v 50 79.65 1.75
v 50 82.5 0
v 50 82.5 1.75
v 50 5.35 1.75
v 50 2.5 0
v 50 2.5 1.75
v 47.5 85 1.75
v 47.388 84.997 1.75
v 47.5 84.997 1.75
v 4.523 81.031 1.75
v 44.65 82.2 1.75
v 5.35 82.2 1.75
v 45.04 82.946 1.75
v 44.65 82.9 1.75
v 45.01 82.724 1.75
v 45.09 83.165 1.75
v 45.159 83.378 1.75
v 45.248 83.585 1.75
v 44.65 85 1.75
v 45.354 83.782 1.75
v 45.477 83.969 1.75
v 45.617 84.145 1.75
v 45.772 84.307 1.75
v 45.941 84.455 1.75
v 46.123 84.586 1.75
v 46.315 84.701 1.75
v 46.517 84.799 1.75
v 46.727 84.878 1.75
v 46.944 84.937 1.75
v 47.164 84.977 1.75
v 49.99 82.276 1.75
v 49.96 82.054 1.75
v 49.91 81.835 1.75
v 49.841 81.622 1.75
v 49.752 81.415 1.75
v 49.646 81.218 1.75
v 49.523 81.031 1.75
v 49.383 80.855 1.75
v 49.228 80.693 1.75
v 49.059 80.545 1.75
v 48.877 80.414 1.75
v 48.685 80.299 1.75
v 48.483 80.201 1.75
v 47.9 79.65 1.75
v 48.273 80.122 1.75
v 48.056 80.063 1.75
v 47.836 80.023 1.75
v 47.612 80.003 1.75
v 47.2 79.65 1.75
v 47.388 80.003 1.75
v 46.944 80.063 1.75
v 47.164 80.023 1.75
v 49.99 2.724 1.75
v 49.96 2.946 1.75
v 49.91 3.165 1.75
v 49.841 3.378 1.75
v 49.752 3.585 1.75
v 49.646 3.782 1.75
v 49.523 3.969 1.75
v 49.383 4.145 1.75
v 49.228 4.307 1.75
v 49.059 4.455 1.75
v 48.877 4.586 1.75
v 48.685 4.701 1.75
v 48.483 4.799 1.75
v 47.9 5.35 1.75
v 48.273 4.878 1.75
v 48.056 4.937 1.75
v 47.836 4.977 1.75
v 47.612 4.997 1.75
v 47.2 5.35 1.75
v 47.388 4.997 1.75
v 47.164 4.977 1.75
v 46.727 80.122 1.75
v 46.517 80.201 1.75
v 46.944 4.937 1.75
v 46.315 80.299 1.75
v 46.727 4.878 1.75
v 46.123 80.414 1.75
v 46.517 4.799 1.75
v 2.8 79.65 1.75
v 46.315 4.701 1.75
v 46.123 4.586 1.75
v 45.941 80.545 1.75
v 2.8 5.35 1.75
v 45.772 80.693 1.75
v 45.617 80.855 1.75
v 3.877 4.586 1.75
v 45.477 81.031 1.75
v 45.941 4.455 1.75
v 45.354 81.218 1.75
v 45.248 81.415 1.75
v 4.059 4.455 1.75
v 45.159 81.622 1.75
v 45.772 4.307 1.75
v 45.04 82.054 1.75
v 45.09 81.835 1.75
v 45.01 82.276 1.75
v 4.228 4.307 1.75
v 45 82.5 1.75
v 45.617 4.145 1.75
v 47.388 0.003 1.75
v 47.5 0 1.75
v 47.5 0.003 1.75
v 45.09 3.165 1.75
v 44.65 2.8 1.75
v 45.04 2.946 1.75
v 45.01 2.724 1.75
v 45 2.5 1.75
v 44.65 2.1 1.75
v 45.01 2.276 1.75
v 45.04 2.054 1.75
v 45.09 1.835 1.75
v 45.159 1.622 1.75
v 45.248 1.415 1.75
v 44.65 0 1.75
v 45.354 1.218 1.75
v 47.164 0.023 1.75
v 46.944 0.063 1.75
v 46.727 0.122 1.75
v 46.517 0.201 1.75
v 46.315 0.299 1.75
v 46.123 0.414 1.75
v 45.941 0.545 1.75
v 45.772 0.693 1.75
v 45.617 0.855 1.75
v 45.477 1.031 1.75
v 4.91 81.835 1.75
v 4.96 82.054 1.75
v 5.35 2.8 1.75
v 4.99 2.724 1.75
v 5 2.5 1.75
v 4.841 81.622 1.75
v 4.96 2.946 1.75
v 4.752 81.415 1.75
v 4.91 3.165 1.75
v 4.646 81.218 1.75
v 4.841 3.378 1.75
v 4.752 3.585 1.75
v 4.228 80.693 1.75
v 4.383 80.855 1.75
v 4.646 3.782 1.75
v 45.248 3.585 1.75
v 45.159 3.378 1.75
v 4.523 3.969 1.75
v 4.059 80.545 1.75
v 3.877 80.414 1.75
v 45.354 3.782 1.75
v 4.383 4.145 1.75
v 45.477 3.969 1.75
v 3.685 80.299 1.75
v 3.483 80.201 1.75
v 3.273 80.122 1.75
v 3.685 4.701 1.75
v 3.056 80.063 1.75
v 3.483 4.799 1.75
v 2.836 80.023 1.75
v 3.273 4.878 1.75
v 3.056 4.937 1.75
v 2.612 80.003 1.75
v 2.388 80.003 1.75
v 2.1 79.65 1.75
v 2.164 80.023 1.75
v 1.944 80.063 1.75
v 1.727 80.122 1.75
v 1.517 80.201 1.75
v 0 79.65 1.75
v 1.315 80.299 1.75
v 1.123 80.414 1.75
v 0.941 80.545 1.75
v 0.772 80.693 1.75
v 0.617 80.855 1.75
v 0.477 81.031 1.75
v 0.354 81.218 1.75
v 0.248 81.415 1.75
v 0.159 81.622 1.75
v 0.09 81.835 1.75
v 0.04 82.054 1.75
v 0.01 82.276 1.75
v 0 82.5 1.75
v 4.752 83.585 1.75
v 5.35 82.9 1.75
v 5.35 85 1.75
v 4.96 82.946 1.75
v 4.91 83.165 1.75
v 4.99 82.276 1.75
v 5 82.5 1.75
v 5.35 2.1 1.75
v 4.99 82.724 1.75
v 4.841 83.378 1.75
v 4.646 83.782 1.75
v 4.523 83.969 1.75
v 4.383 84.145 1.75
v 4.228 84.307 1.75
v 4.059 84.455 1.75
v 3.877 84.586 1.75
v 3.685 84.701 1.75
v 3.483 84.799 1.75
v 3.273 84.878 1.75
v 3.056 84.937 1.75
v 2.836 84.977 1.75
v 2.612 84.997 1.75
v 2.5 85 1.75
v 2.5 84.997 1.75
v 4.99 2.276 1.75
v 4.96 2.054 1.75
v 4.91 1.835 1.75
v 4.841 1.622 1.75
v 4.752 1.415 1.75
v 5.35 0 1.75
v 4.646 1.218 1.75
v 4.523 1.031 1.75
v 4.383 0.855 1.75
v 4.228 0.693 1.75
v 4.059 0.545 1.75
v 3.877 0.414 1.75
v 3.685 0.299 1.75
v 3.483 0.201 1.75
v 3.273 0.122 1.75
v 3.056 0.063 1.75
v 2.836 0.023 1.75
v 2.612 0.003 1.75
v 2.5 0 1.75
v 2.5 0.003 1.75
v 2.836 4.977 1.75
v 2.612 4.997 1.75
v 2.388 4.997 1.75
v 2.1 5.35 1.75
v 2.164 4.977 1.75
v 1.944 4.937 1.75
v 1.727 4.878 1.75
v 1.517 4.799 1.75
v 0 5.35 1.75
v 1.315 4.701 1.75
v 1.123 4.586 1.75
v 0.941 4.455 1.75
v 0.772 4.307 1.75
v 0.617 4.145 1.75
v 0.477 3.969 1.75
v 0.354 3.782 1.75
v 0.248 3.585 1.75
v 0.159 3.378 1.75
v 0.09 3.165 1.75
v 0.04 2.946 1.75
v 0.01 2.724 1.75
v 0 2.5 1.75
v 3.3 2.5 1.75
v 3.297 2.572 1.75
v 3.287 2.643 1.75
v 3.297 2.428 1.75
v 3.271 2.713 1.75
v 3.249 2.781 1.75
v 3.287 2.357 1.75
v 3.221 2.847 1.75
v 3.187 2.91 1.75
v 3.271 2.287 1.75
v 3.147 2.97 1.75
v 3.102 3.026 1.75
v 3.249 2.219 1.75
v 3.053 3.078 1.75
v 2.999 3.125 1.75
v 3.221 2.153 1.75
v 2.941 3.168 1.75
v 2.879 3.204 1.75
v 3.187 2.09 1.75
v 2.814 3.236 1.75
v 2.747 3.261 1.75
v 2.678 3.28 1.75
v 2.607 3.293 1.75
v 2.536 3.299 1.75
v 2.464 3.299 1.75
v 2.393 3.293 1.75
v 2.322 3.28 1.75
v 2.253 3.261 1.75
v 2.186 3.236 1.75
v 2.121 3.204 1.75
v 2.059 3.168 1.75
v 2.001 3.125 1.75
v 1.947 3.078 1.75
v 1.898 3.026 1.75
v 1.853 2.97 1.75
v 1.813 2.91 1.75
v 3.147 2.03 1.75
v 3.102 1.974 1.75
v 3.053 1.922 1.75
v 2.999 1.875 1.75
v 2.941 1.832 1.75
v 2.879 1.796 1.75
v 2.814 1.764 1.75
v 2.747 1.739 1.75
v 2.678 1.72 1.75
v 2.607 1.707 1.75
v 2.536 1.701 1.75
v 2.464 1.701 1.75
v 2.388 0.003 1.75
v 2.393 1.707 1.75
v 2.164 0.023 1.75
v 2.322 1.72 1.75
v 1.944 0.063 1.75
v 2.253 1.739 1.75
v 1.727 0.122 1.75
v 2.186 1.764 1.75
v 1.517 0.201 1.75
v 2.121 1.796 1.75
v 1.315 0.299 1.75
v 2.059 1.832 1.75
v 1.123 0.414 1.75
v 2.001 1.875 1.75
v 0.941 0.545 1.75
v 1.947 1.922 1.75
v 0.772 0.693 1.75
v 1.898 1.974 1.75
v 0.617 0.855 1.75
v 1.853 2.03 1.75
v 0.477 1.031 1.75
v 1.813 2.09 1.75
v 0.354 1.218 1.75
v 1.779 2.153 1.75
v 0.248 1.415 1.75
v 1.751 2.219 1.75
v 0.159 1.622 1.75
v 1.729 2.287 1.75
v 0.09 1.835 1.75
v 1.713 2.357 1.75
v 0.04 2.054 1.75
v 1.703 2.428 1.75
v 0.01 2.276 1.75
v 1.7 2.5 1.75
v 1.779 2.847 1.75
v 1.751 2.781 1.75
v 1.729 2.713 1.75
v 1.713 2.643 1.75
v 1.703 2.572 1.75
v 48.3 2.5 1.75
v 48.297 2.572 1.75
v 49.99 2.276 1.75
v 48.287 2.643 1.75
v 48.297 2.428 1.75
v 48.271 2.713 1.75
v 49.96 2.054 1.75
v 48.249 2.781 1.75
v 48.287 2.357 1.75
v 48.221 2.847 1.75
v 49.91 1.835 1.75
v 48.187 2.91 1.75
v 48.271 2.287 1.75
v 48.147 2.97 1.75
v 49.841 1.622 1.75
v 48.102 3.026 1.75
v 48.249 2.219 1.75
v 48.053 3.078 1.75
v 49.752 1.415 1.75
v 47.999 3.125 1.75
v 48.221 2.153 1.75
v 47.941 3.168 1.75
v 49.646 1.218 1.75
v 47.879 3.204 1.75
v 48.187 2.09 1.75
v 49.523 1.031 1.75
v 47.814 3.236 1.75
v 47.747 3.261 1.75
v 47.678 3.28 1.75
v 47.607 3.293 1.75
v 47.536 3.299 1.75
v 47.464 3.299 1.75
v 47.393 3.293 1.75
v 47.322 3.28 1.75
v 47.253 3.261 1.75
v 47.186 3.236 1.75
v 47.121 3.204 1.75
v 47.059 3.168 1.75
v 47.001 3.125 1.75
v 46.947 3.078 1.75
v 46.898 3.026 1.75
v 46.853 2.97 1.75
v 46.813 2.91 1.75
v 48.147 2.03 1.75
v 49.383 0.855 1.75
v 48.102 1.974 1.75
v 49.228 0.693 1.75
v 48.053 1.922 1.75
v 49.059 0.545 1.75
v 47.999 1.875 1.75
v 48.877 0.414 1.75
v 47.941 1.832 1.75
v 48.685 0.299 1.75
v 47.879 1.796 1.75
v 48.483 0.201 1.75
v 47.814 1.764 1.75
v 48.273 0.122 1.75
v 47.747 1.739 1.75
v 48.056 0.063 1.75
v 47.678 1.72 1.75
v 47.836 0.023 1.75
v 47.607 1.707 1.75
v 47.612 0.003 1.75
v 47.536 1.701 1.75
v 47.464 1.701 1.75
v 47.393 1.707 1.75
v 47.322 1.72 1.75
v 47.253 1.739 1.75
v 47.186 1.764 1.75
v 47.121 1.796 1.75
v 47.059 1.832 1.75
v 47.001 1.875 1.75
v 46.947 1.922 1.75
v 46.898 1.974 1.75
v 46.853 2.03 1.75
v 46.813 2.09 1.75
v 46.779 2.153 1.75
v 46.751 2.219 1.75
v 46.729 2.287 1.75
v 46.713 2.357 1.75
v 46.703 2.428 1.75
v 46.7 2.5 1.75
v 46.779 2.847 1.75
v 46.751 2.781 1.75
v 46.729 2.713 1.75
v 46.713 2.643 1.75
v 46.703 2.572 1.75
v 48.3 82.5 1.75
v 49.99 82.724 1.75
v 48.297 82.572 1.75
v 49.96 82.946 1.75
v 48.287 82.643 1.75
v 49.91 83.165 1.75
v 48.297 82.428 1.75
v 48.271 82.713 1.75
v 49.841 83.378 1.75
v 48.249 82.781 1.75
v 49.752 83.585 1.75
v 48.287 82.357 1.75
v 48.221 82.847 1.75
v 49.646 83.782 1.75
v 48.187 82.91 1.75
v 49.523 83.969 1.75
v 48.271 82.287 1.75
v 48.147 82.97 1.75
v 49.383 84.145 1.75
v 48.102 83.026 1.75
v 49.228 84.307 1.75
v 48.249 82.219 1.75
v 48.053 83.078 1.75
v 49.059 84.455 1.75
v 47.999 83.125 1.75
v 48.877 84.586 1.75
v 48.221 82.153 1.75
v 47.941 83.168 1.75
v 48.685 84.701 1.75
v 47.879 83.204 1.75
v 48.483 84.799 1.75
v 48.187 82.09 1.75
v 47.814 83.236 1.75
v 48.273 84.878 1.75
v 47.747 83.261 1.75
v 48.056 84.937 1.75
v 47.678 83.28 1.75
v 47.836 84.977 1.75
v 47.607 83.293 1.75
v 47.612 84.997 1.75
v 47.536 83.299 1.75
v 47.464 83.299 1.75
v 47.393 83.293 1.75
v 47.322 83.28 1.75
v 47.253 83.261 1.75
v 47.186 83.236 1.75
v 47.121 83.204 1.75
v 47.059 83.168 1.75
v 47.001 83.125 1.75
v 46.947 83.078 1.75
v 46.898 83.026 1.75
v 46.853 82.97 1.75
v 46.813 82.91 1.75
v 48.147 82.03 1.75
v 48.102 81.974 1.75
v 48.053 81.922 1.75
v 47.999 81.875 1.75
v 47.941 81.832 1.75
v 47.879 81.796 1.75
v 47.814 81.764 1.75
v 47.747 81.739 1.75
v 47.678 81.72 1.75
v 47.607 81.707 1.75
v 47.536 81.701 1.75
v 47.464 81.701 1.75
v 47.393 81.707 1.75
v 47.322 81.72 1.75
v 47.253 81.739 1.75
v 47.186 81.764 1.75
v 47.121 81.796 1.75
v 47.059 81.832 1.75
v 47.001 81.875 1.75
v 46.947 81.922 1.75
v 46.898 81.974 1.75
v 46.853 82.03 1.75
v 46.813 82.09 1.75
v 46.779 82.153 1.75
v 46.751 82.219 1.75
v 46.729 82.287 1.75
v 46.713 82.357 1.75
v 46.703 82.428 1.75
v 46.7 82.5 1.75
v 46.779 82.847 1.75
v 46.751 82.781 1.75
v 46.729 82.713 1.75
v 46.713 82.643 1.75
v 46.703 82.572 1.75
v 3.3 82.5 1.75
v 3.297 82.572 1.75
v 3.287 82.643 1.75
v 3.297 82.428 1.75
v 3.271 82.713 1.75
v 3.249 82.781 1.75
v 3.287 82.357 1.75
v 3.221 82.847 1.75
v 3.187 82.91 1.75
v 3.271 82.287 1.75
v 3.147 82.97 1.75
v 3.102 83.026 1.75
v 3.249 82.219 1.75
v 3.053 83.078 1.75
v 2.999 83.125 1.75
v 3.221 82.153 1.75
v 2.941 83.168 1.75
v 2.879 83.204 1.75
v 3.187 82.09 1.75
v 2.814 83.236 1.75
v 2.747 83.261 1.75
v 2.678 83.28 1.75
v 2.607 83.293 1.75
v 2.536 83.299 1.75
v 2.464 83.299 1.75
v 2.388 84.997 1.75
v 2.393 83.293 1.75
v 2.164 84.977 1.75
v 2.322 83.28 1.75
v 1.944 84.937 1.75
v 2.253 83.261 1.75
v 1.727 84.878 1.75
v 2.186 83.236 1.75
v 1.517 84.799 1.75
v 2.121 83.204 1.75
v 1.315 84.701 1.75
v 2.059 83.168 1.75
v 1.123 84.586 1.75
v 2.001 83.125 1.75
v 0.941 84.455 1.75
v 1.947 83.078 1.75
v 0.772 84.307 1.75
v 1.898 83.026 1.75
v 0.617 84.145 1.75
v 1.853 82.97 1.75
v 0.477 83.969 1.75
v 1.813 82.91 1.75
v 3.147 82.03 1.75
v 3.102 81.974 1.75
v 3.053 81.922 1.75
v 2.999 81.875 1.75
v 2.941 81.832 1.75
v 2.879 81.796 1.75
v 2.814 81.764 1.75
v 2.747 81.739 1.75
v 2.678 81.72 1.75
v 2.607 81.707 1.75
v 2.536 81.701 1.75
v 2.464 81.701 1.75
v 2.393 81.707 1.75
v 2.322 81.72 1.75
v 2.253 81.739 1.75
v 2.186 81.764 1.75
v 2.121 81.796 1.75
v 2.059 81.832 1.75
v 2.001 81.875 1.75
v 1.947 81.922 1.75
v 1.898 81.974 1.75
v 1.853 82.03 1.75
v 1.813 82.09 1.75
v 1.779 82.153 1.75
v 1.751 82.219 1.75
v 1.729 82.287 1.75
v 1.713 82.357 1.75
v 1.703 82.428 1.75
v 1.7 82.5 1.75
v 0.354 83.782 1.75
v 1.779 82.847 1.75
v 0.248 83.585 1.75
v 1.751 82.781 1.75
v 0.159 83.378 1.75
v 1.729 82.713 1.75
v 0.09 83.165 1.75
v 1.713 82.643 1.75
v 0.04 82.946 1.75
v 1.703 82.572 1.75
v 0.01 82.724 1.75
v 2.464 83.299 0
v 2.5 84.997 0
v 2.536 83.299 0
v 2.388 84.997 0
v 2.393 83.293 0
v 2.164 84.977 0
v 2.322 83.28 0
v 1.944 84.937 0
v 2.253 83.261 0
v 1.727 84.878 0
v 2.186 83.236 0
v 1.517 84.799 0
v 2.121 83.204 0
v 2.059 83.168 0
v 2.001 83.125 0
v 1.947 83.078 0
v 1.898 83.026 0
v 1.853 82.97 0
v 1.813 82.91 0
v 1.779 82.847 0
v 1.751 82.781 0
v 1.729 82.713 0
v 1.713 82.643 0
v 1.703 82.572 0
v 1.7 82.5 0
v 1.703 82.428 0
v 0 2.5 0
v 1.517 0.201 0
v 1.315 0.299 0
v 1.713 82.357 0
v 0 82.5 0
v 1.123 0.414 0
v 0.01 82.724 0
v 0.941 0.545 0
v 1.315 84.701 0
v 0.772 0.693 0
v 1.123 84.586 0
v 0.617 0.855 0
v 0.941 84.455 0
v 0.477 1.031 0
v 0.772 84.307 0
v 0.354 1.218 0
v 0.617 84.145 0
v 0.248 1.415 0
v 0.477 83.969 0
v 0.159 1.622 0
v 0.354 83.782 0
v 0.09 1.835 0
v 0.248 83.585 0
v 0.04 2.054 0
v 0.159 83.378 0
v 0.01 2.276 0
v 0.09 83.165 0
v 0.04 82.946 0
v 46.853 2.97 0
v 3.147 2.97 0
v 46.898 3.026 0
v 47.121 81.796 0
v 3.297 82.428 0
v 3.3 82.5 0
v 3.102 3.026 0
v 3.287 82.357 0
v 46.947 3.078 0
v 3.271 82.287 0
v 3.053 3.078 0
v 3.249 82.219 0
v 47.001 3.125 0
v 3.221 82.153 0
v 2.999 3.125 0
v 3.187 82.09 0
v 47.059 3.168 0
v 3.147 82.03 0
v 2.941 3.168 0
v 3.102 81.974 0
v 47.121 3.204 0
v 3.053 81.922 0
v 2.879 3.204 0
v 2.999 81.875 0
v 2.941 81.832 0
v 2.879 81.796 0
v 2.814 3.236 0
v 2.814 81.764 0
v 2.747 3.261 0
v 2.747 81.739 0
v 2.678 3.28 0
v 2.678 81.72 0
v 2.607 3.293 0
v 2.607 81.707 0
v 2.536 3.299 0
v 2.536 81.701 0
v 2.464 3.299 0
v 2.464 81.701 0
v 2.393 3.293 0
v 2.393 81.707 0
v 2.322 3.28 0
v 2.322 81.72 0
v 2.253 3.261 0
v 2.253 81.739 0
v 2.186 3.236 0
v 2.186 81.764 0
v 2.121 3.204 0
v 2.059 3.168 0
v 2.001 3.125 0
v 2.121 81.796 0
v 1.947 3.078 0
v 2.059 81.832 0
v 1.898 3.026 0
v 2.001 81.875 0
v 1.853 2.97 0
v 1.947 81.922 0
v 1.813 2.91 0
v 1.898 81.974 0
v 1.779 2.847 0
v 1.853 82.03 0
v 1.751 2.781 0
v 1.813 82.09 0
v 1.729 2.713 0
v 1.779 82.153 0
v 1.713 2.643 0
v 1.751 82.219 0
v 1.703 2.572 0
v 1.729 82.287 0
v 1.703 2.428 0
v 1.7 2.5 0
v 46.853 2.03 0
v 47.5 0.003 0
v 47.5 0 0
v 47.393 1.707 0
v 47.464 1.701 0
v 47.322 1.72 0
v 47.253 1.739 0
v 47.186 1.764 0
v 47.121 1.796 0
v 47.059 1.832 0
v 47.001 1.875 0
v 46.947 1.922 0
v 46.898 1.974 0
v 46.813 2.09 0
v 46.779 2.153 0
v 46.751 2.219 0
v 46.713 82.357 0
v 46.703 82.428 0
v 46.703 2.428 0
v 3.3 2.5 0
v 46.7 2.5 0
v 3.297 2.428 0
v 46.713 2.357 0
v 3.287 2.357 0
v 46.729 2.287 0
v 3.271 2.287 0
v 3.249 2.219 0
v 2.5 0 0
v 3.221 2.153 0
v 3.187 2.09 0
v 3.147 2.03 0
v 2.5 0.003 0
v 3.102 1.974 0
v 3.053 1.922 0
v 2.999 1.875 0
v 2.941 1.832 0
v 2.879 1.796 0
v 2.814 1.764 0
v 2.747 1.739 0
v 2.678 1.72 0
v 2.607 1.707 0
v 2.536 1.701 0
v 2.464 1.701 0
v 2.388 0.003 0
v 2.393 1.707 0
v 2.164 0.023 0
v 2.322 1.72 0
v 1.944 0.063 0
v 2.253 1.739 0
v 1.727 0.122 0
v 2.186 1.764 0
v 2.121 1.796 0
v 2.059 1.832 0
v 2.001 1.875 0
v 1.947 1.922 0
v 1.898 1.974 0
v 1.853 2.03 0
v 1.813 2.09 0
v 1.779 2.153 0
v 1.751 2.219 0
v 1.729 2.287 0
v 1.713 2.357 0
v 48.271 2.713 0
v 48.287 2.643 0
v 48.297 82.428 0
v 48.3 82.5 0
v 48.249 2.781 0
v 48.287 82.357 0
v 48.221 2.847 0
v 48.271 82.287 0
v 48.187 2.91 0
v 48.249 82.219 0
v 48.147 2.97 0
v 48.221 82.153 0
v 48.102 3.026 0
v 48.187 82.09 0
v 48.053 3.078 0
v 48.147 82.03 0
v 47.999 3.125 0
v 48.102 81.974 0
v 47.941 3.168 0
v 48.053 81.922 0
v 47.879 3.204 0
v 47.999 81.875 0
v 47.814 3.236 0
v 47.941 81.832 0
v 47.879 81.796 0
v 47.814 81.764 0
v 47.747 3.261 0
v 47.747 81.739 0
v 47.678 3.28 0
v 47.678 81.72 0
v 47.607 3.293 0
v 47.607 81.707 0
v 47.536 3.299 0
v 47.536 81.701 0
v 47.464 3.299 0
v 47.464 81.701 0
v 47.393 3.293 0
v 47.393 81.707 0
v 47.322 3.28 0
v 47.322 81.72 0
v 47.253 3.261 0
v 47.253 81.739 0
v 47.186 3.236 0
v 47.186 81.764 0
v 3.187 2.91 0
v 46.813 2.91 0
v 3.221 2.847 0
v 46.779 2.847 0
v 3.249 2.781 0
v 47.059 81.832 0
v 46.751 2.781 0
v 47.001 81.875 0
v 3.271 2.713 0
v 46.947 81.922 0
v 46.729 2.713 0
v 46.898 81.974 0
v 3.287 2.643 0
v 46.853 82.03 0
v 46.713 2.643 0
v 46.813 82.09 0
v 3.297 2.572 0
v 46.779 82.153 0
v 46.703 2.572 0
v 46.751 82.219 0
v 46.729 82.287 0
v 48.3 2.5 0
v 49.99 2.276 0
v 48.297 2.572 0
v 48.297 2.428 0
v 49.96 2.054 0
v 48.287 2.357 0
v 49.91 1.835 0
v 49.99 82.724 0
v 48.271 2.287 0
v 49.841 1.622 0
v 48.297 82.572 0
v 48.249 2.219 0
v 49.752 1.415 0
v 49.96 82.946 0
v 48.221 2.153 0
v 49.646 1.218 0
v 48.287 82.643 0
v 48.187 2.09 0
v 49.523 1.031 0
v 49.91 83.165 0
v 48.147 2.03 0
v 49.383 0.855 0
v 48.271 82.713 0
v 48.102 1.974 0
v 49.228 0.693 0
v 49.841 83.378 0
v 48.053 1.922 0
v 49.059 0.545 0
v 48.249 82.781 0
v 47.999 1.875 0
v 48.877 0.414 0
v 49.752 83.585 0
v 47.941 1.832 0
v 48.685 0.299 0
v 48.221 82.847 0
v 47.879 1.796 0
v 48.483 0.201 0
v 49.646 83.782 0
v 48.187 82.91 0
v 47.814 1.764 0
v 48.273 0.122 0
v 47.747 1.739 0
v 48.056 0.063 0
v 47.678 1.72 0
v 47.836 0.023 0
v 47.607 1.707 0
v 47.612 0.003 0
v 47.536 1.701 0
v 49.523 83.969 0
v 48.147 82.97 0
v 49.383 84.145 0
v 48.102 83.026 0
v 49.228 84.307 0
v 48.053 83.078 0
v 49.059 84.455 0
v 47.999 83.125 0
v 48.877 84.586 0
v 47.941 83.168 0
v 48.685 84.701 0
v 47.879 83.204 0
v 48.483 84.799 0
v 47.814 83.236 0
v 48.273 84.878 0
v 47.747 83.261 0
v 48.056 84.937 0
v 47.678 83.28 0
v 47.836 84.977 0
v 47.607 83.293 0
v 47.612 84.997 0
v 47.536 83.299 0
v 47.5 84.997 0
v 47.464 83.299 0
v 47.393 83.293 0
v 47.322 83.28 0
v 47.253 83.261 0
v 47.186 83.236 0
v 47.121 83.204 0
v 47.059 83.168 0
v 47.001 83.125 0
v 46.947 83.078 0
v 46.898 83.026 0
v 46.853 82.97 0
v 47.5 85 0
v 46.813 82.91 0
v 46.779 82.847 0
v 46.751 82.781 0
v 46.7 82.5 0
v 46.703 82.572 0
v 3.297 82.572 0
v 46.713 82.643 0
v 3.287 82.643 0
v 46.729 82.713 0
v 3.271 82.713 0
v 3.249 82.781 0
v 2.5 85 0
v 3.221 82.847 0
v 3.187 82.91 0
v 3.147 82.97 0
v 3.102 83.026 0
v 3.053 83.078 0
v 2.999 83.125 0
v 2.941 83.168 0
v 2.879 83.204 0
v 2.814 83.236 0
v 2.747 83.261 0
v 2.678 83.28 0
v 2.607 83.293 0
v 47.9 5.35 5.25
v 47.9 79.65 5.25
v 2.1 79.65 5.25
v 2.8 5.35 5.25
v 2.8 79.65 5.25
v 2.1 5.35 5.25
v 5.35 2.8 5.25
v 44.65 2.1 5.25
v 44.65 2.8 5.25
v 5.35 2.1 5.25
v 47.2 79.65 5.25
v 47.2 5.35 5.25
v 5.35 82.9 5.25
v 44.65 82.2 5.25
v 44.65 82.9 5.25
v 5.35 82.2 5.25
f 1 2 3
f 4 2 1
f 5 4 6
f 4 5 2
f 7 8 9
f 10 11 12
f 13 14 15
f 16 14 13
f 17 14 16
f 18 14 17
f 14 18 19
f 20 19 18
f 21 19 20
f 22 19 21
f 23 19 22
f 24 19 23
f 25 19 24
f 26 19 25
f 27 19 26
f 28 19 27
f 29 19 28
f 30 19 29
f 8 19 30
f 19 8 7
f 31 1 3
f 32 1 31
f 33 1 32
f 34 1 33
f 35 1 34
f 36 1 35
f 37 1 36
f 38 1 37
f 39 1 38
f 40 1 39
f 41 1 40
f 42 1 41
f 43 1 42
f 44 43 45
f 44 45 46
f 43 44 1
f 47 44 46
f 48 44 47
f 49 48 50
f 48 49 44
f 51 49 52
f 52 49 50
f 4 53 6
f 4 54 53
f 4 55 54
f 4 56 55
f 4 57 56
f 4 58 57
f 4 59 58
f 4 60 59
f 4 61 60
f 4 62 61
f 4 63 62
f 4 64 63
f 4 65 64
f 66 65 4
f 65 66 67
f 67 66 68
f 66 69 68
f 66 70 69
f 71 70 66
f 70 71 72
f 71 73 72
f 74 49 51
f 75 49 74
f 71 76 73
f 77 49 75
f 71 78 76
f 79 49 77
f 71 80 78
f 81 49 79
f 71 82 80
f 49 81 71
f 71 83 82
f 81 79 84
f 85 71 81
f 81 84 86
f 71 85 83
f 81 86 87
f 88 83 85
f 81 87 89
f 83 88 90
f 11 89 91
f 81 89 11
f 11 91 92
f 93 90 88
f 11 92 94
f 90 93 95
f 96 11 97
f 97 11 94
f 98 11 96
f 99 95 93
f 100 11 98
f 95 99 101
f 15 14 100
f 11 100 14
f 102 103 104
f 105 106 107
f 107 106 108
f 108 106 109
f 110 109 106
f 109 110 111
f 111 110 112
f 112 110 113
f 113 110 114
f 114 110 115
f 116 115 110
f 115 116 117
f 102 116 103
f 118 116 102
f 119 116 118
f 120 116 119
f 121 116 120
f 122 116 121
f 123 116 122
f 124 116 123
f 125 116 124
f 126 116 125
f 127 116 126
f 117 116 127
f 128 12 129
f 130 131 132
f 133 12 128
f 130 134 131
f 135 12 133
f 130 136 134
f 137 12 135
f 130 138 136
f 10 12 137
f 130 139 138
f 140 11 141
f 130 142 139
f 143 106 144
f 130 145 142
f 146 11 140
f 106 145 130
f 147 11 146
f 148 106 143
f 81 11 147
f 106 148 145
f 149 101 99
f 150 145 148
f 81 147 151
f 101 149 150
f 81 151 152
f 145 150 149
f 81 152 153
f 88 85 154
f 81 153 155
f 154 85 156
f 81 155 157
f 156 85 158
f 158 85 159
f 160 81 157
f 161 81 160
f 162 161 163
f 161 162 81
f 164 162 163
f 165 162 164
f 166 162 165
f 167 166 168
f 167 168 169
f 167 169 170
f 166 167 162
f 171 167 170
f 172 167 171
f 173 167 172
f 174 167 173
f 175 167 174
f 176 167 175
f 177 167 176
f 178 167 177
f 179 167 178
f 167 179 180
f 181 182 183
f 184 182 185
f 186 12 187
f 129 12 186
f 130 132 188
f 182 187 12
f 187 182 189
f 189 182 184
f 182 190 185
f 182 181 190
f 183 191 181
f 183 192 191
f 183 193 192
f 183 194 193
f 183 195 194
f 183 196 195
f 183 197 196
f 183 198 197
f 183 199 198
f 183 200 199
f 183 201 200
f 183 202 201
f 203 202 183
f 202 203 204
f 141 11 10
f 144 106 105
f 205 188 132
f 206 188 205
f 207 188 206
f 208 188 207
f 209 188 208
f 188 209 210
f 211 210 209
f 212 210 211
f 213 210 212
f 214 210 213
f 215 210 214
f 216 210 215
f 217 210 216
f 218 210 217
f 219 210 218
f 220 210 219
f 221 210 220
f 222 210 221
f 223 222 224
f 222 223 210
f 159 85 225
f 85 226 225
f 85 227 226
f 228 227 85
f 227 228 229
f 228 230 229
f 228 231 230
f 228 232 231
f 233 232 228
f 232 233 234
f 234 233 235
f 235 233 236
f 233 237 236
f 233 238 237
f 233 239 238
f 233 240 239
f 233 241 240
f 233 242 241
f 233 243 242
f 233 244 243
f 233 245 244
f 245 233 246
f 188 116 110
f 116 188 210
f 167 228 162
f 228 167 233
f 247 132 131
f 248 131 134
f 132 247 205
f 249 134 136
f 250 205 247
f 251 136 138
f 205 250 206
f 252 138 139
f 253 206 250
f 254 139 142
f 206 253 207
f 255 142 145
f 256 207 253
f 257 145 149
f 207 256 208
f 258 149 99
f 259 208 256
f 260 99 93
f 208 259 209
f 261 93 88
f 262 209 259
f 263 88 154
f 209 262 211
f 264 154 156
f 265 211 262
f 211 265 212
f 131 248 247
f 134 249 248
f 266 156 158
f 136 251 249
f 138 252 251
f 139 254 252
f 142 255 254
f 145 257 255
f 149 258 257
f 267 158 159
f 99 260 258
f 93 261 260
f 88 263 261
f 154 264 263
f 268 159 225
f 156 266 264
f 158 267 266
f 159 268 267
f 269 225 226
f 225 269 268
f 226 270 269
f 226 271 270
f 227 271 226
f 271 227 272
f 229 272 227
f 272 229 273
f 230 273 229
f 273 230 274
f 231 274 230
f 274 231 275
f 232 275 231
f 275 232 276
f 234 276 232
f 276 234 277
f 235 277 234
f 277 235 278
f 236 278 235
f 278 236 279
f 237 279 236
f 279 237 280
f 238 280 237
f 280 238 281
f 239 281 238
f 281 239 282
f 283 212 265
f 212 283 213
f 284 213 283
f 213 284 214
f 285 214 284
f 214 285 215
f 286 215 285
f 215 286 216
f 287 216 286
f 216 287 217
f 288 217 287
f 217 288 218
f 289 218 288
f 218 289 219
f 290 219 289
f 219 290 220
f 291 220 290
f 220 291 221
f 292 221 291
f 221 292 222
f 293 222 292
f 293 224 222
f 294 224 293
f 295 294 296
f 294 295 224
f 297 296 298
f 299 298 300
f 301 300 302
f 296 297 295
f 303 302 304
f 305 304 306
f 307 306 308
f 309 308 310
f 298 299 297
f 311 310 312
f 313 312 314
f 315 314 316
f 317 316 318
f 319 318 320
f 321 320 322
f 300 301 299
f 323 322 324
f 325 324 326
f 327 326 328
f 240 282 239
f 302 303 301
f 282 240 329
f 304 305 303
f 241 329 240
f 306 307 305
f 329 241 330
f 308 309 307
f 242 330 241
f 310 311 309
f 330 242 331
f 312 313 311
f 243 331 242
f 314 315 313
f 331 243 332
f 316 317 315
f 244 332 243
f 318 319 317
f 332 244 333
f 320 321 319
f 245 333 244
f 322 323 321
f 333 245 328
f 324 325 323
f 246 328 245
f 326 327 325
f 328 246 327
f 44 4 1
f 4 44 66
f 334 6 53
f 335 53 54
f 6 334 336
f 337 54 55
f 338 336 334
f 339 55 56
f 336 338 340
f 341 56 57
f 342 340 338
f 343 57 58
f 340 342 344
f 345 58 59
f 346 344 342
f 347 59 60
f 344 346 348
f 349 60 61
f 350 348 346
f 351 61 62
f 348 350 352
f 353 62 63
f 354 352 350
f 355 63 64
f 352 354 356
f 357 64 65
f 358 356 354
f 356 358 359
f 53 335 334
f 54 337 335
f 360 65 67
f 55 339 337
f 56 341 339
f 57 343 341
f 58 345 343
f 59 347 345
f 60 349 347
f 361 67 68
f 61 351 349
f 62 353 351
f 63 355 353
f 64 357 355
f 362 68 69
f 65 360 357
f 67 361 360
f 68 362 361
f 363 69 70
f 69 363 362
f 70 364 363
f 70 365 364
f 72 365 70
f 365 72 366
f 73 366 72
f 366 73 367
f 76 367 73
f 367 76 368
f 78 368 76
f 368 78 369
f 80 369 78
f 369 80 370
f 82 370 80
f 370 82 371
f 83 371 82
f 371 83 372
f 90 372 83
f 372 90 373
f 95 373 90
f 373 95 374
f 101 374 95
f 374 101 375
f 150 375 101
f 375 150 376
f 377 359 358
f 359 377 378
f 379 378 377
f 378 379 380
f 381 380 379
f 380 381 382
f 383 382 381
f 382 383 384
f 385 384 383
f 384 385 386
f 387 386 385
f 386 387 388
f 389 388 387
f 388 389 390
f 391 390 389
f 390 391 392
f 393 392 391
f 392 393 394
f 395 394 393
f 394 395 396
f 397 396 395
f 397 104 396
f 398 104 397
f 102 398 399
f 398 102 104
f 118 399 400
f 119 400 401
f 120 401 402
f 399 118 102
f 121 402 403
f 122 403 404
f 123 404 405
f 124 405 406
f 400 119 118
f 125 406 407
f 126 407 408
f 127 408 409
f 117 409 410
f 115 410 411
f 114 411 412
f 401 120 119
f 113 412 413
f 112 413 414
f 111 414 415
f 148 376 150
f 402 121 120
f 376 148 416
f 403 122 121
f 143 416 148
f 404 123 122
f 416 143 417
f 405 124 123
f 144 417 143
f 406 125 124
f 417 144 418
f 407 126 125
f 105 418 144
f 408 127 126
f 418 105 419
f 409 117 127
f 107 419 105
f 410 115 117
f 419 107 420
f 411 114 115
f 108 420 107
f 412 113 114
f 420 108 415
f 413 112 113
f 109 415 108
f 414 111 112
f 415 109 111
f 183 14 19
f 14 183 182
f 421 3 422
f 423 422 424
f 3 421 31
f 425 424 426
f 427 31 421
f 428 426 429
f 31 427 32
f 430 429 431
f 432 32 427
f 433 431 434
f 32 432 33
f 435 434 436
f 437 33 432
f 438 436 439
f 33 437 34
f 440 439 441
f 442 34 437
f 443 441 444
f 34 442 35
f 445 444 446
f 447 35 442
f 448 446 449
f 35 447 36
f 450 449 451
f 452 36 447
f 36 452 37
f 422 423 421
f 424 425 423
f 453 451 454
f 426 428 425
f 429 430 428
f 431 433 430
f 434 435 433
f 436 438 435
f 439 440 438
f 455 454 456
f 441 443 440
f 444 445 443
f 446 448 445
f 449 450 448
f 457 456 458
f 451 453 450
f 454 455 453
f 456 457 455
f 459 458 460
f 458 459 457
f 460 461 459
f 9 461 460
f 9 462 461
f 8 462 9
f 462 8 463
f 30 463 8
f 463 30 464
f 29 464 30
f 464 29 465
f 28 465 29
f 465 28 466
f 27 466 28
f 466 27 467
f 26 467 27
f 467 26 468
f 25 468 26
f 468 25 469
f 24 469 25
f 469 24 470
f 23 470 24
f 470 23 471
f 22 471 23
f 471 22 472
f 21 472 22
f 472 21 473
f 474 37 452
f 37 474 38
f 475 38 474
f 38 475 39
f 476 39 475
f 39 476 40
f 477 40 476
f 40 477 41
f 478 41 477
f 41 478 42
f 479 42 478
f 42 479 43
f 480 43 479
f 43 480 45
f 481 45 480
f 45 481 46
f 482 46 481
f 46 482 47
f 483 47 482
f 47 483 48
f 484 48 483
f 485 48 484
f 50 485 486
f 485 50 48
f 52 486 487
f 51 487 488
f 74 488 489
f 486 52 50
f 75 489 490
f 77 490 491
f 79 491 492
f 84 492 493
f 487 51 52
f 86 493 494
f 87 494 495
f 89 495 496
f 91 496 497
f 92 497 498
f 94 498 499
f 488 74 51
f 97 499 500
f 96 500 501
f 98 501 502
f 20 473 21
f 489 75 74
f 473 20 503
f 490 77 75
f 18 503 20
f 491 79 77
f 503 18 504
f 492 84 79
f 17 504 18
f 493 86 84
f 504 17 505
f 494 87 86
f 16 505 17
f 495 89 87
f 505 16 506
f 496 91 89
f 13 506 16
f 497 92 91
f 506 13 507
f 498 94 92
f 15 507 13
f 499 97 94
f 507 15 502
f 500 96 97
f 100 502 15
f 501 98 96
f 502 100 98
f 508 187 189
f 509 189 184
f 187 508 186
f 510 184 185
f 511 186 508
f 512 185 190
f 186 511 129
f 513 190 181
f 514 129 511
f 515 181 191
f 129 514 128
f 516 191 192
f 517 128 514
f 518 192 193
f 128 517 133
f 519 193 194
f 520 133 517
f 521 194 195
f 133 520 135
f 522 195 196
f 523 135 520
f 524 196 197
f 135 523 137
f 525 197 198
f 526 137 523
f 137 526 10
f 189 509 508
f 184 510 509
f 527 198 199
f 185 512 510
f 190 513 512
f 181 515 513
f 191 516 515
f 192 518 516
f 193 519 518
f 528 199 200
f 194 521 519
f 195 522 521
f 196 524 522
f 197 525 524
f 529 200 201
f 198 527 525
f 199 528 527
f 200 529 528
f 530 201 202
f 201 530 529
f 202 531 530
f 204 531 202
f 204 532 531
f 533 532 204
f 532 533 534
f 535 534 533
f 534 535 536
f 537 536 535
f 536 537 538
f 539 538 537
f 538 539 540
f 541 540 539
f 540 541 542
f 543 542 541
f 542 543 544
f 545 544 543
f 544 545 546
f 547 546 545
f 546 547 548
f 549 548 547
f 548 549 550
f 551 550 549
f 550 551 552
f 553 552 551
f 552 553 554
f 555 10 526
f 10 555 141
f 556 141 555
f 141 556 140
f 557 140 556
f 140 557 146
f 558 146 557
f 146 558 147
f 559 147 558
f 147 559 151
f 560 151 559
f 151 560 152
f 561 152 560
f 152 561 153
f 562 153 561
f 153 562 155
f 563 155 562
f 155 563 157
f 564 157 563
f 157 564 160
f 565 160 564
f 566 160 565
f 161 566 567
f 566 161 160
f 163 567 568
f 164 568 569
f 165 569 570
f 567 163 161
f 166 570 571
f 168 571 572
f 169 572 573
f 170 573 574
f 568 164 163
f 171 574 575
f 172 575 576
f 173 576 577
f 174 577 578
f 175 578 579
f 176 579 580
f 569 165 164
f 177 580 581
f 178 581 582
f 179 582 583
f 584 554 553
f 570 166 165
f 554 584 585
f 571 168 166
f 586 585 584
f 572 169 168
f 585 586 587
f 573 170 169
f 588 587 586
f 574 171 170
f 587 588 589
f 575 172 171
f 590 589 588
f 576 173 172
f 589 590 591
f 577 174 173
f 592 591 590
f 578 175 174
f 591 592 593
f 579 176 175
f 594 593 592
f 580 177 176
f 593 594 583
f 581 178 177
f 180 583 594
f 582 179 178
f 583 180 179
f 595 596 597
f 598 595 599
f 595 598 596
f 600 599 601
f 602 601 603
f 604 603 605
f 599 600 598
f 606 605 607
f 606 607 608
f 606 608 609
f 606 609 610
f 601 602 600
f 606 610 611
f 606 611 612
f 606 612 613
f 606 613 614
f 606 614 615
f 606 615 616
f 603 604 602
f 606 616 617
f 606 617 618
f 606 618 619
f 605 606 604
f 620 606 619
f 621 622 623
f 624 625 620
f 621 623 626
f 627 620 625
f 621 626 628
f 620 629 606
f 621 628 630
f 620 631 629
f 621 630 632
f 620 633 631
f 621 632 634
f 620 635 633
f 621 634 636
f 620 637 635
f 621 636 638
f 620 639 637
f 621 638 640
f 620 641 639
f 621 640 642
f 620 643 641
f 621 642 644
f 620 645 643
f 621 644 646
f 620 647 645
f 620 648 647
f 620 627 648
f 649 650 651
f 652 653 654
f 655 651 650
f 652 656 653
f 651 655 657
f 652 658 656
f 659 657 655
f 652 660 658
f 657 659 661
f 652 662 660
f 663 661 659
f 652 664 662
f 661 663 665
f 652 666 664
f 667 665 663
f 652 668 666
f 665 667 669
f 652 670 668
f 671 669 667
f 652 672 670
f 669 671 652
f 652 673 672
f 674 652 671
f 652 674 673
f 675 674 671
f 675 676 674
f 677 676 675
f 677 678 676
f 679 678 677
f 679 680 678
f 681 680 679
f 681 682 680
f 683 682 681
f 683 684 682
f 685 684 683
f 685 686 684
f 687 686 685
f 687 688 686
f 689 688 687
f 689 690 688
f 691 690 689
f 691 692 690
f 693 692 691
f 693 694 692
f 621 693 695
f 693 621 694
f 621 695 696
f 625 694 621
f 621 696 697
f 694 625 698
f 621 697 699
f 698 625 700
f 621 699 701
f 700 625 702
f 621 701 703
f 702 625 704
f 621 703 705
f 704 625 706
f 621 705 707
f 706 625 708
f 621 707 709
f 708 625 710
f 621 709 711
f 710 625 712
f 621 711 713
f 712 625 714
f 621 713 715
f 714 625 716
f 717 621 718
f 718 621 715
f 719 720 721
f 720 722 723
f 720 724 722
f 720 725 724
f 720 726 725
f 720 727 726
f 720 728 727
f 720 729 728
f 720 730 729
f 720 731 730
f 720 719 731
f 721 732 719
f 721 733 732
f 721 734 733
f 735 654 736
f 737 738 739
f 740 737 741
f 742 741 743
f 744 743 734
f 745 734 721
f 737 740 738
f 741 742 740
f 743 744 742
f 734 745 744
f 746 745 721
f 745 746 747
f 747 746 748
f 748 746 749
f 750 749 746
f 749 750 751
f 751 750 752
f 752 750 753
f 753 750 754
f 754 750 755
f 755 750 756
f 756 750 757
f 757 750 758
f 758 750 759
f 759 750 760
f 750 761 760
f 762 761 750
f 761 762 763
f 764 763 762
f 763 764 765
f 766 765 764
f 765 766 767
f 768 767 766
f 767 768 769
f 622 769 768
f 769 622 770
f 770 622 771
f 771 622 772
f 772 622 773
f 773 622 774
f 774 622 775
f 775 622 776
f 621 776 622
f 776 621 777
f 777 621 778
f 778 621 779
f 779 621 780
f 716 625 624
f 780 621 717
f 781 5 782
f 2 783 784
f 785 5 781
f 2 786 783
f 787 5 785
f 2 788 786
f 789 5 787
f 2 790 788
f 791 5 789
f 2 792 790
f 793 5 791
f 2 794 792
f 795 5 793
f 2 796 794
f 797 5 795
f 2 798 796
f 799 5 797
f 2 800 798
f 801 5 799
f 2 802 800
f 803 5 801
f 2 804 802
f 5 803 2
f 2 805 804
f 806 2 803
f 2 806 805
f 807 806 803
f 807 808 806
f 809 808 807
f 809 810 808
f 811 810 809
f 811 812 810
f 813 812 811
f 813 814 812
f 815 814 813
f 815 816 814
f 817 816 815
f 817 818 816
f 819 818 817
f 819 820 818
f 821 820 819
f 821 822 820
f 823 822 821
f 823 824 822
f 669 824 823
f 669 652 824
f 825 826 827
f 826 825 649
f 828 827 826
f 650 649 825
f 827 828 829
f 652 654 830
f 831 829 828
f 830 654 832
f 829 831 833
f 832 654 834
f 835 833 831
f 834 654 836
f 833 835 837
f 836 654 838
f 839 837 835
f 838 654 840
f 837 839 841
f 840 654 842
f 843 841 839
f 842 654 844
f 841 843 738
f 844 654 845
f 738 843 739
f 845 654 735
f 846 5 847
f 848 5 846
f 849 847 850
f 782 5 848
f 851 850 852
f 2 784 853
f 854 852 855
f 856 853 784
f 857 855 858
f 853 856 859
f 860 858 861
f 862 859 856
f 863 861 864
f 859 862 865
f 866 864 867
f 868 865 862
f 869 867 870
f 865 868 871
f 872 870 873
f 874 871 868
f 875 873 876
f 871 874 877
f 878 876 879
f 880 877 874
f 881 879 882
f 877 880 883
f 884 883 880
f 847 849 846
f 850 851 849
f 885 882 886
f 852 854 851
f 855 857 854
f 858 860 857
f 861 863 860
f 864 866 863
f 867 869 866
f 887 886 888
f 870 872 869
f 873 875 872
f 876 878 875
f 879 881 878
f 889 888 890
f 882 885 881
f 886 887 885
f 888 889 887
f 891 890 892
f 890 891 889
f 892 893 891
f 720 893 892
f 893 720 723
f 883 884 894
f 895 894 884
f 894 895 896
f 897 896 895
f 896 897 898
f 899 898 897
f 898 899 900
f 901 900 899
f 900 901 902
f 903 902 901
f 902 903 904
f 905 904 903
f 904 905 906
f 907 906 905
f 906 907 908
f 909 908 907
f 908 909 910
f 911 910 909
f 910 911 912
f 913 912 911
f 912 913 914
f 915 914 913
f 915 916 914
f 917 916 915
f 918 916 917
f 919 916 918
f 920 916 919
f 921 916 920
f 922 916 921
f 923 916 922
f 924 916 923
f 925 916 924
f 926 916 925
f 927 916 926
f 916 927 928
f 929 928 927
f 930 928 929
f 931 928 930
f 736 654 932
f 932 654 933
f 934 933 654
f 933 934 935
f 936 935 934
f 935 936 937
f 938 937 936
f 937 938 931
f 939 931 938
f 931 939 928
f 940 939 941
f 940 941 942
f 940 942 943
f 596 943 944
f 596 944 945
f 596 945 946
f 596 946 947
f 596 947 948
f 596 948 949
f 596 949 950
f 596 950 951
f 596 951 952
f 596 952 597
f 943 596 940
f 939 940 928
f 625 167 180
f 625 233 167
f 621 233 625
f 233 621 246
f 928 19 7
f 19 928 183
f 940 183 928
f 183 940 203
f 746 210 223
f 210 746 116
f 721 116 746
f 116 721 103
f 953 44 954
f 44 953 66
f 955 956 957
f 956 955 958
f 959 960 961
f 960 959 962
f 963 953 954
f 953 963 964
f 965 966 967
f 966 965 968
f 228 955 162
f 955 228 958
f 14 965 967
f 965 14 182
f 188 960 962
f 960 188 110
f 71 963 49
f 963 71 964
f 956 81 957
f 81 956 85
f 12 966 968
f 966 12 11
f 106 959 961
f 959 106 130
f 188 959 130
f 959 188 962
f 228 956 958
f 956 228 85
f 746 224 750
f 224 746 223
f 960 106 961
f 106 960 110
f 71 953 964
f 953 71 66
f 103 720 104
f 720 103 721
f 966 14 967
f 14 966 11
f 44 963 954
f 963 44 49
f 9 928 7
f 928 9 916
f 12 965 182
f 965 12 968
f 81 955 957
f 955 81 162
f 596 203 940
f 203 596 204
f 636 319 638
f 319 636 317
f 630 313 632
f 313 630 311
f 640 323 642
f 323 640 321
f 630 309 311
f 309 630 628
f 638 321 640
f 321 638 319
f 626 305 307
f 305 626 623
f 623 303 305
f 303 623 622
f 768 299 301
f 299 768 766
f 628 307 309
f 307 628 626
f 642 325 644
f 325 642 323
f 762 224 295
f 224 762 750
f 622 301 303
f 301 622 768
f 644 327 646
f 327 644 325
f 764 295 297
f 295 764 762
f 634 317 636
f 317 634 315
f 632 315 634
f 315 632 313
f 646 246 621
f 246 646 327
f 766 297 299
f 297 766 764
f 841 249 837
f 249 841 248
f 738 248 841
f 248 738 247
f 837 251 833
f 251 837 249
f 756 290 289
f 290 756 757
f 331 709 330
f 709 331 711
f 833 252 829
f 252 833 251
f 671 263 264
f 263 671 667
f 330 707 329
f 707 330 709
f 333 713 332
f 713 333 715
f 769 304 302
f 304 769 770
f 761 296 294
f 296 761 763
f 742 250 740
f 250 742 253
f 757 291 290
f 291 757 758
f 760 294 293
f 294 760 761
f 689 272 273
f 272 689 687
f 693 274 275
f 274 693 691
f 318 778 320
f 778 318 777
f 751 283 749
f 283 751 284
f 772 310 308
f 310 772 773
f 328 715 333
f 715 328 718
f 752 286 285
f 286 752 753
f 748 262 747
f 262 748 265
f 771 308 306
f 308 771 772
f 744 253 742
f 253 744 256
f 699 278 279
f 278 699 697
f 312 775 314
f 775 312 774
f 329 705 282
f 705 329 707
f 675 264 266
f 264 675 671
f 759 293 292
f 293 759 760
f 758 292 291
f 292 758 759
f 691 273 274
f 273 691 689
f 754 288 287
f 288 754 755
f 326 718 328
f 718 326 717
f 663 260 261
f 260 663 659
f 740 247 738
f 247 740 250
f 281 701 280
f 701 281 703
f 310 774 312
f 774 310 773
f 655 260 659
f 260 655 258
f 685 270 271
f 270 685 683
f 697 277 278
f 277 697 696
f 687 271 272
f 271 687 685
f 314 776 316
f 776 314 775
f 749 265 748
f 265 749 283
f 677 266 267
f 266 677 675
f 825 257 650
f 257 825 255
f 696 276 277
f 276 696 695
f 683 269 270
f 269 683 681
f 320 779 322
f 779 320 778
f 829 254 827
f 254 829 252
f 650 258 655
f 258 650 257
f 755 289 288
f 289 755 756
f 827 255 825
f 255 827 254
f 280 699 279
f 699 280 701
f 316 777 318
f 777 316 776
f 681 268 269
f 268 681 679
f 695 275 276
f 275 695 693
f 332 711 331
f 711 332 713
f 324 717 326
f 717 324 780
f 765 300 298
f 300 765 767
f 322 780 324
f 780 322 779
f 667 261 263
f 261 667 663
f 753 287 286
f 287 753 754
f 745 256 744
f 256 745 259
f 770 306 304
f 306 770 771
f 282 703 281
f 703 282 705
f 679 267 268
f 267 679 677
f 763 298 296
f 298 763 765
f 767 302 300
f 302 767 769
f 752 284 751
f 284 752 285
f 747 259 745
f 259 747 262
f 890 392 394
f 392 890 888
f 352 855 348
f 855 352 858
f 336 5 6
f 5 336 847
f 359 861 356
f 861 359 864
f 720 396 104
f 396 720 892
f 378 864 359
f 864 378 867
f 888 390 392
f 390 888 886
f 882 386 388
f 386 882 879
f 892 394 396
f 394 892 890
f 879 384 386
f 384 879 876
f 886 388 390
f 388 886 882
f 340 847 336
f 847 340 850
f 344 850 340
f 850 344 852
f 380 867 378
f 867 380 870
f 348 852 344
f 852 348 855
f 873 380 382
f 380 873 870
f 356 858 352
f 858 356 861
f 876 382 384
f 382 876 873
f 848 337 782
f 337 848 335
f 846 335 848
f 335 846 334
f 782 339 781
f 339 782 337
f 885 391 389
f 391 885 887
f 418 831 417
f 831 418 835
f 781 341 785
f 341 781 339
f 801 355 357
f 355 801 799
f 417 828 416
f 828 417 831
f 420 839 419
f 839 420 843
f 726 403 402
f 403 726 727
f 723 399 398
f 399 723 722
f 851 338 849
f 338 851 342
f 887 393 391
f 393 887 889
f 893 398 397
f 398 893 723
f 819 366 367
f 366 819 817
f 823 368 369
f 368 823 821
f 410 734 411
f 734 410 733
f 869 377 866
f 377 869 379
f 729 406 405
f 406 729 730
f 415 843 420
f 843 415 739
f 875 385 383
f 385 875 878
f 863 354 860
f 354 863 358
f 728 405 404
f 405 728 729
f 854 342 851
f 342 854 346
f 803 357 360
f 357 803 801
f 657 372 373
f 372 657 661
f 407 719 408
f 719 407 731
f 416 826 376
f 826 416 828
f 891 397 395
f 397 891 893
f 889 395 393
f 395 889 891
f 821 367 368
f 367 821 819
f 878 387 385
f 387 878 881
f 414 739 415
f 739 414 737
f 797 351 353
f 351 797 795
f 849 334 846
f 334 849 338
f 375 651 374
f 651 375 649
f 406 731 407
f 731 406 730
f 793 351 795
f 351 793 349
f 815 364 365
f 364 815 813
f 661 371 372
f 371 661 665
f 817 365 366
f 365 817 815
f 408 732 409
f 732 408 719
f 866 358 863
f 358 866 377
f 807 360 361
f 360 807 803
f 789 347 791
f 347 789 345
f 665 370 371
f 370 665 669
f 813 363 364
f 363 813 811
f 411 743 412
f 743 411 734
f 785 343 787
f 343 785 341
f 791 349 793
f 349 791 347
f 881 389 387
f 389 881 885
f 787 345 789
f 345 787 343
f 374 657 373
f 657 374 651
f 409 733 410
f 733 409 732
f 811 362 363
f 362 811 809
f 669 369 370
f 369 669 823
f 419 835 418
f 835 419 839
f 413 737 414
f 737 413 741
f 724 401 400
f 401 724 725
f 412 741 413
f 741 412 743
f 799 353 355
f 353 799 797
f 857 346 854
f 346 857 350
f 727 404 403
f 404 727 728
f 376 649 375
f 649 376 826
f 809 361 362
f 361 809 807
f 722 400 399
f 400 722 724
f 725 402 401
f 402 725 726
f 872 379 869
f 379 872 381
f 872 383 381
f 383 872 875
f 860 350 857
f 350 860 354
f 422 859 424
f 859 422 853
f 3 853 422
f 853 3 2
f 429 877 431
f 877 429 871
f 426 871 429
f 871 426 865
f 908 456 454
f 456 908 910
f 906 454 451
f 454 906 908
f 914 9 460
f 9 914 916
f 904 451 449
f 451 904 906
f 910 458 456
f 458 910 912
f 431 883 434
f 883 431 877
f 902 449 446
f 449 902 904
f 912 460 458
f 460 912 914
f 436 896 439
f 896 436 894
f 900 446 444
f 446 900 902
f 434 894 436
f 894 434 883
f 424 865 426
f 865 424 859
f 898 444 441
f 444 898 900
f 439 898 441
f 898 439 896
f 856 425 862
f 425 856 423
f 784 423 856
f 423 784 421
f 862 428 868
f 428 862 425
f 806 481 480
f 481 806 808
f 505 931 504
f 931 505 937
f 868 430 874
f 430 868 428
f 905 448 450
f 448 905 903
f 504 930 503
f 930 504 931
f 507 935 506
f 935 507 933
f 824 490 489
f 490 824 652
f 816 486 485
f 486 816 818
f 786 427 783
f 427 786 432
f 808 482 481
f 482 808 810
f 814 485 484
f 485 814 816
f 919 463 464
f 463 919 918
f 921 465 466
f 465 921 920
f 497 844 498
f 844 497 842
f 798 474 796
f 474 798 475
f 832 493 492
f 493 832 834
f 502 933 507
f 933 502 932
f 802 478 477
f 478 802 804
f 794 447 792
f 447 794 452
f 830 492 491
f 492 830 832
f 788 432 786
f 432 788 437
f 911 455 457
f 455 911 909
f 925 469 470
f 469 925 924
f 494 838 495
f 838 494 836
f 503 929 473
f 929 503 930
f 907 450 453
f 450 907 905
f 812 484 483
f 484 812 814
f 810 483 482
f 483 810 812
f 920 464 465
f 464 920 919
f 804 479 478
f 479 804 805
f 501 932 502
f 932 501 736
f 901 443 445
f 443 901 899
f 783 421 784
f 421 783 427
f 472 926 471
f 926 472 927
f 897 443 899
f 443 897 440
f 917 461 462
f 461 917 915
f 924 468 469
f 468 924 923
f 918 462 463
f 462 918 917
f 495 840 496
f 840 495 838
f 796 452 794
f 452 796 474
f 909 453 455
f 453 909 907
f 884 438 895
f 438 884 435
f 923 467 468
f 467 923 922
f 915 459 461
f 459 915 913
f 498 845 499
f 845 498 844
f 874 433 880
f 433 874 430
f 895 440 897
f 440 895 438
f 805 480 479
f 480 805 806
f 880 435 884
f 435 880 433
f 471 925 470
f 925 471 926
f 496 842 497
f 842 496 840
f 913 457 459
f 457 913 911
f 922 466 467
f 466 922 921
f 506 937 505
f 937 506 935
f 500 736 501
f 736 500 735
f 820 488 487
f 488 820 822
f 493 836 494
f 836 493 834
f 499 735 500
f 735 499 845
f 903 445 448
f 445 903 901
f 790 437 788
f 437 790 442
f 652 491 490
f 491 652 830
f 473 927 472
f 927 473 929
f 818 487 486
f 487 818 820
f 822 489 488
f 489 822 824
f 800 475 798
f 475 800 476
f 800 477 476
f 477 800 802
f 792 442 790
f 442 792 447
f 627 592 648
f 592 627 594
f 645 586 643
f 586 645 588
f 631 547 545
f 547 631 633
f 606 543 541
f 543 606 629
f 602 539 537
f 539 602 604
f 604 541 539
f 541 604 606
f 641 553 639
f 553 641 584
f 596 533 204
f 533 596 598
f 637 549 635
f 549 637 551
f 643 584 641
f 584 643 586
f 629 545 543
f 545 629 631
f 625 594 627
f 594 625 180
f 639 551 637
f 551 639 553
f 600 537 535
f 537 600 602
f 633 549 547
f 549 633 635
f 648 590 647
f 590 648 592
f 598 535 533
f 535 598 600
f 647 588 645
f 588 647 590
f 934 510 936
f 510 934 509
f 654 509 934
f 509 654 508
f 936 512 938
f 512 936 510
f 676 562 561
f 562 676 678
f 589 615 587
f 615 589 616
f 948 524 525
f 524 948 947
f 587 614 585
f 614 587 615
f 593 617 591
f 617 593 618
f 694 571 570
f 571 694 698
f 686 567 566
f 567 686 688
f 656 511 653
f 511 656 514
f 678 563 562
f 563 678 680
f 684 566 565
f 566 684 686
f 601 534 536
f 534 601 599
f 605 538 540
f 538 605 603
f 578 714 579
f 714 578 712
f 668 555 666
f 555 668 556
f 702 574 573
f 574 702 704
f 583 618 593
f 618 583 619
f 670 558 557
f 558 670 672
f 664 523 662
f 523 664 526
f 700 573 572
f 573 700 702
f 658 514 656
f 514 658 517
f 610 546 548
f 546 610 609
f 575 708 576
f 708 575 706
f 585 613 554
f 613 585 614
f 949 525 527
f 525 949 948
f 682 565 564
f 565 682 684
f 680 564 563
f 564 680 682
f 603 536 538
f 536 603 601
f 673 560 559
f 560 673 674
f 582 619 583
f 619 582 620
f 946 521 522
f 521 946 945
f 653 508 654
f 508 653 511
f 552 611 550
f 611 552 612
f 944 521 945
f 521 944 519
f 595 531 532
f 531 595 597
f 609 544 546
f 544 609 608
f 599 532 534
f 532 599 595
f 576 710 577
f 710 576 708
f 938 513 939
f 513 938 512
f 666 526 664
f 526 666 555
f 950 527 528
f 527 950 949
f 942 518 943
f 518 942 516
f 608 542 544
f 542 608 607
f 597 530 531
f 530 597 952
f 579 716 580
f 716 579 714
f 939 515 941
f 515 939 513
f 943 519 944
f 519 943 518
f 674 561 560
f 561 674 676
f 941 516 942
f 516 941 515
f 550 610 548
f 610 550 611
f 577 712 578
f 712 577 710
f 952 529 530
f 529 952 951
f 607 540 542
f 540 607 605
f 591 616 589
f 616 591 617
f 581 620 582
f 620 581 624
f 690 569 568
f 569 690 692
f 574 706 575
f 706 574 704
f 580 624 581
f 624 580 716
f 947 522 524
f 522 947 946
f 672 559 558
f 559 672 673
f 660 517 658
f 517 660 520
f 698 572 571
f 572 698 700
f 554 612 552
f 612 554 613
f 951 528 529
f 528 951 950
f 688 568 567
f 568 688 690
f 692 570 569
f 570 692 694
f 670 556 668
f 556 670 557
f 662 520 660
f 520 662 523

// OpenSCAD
//everything is in units of millimeters
resolution = 0.35;

//variables to keep in-sync with the other scad file
mainDepth = 50;
mainWidth = 85;
mainHeight = 40;
mainShellThickness = 5 * resolution;
screwCylinderRadius = 2.5;
screwHoleCylinderRadius = 0.8;
screwHoleCylinderOffsetFromFloor = mainHeight / 2;
cylinderFragments = 70;

margin = mainShellThickness + resolution;
lidThickness = resolution * 5; //z-axis
lidWidth = resolution * 2; //x & y axis thickness of the wall
innerLipHeight = resolution * 10;

difference() {
  union() {
    //top cover of the lid
    cube([mainDepth, mainWidth, lidThickness]);
    
    //the inner lip
    translate([margin, margin, lidThickness]) {
      cube([mainDepth - margin*2, mainWidth - margin*2, innerLipHeight]);
    };
  };
  
  //cutting out the inside to save on plastic used
  translate([margin + lidWidth, margin + lidWidth, lidThickness]) {
    cube([mainDepth - margin*2 - lidWidth*2, mainWidth - margin*2 - lidWidth*2, innerLipHeight]);
  };
  
  
  
  //cutting away room at the corner of the lip to make room for the cylinders where screws go.
  //rear-left
  translate([0, 0, lidThickness]) {
    cube([screwCylinderRadius*2 + resolution, screwCylinderRadius*2 + resolution, innerLipHeight]);
  };
  translate([0, 0, 0]) {
    cube([screwCylinderRadius, screwCylinderRadius, lidThickness]);
  };
  translate([screwCylinderRadius - screwHoleCylinderRadius, screwCylinderRadius - screwHoleCylinderRadius, 0]) {
    cube([screwHoleCylinderRadius*2, screwHoleCylinderRadius*2, lidThickness]);
  };
  
  //cutting away room at the corner of the lip to make room for the cylinders where screws go.
  //front-left
  translate([mainDepth - screwCylinderRadius*2 - resolution, 0, lidThickness]) {
    cube([screwCylinderRadius*2 + resolution, screwCylinderRadius*2 + resolution, innerLipHeight]);
  };
  translate([mainDepth - screwCylinderRadius, 0, 0]) {
    cube([screwCylinderRadius, screwCylinderRadius, lidThickness]);
  };
  translate([mainDepth - screwCylinderRadius - screwHoleCylinderRadius, screwCylinderRadius - screwHoleCylinderRadius, 0]) {
    cube([screwHoleCylinderRadius*2, screwHoleCylinderRadius*2, lidThickness]);
  };
  
  //cutting away room at the corner of the lip to make room for the cylinders where screws go.
  //front-right
  translate([mainDepth - screwCylinderRadius*2 - resolution, mainWidth - screwCylinderRadius*2 - resolution, lidThickness]) {
    cube([screwCylinderRadius*2 + resolution, screwCylinderRadius*2 + resolution, innerLipHeight]);
  };
  translate([mainDepth - screwCylinderRadius, mainWidth - screwCylinderRadius, 0]) {
    cube([screwCylinderRadius, screwCylinderRadius, lidThickness]);
  };
  translate([mainDepth - screwCylinderRadius - screwHoleCylinderRadius, mainWidth - screwCylinderRadius - screwHoleCylinderRadius, 0]) {
    cube([screwHoleCylinderRadius*2, screwHoleCylinderRadius*2, lidThickness]);
  };
  
  //cutting away room at the corner of the lip to make room for the cylinders where screws go.
  //rear-right
  translate([0, mainWidth - screwCylinderRadius*2 - resolution, lidThickness]) {
    cube([screwCylinderRadius*2 + resolution, screwCylinderRadius*2 + resolution, innerLipHeight]);
  };
  translate([0, mainWidth - screwCylinderRadius, 0]) {
    cube([screwCylinderRadius, screwCylinderRadius, lidThickness]);
  };
  translate([screwCylinderRadius - screwHoleCylinderRadius, mainWidth - screwCylinderRadius - screwHoleCylinderRadius, 0]) {
    cube([screwHoleCylinderRadius*2, screwHoleCylinderRadius*2, lidThickness]);
  };
};



difference() {
  //add the curve to the rear-left
  translate([screwCylinderRadius, screwCylinderRadius, 0]) {
    cylinder(lidThickness, screwCylinderRadius, screwCylinderRadius, $fn=cylinderFragments);
  };
  //screw hole, rear-left
  translate([screwCylinderRadius, screwCylinderRadius, 0]) {
    cylinder(lidThickness, screwHoleCylinderRadius, screwHoleCylinderRadius, $fn=cylinderFragments);
  };
};


difference() { 
  //add the curve to the front-left
  translate([mainDepth - screwCylinderRadius, screwCylinderRadius, 0]) {
    cylinder(lidThickness, screwCylinderRadius, screwCylinderRadius, $fn=cylinderFragments);
  };
  //screw hole, front-left
  translate([mainDepth - screwCylinderRadius, screwCylinderRadius, 0]) {
    cylinder(lidThickness, screwHoleCylinderRadius, screwHoleCylinderRadius, $fn=cylinderFragments);
  };
};
  

difference() {
  //add the curve to the front-right
  translate([mainDepth - screwCylinderRadius, mainWidth - screwCylinderRadius, 0]) {
    cylinder(lidThickness, screwCylinderRadius, screwCylinderRadius, $fn=cylinderFragments);
  };
  //screw hole, front-right
  translate([mainDepth - screwCylinderRadius, mainWidth - screwCylinderRadius, 0]) {
    cylinder(lidThickness, screwHoleCylinderRadius, screwHoleCylinderRadius, $fn=cylinderFragments);
  };
};

difference() {
  //add the curve to the rear-right
  translate([screwCylinderRadius, mainWidth - screwCylinderRadius, 0]) {
    cylinder(lidThickness, screwCylinderRadius, screwCylinderRadius, $fn=cylinderFragments);
  };
  //screw hole, rear-right
  translate([screwCylinderRadius, mainWidth - screwCylinderRadius, 0]) {
    cylinder(lidThickness, screwHoleCylinderRadius, screwHoleCylinderRadius, $fn=cylinderFragments);
  };
};
